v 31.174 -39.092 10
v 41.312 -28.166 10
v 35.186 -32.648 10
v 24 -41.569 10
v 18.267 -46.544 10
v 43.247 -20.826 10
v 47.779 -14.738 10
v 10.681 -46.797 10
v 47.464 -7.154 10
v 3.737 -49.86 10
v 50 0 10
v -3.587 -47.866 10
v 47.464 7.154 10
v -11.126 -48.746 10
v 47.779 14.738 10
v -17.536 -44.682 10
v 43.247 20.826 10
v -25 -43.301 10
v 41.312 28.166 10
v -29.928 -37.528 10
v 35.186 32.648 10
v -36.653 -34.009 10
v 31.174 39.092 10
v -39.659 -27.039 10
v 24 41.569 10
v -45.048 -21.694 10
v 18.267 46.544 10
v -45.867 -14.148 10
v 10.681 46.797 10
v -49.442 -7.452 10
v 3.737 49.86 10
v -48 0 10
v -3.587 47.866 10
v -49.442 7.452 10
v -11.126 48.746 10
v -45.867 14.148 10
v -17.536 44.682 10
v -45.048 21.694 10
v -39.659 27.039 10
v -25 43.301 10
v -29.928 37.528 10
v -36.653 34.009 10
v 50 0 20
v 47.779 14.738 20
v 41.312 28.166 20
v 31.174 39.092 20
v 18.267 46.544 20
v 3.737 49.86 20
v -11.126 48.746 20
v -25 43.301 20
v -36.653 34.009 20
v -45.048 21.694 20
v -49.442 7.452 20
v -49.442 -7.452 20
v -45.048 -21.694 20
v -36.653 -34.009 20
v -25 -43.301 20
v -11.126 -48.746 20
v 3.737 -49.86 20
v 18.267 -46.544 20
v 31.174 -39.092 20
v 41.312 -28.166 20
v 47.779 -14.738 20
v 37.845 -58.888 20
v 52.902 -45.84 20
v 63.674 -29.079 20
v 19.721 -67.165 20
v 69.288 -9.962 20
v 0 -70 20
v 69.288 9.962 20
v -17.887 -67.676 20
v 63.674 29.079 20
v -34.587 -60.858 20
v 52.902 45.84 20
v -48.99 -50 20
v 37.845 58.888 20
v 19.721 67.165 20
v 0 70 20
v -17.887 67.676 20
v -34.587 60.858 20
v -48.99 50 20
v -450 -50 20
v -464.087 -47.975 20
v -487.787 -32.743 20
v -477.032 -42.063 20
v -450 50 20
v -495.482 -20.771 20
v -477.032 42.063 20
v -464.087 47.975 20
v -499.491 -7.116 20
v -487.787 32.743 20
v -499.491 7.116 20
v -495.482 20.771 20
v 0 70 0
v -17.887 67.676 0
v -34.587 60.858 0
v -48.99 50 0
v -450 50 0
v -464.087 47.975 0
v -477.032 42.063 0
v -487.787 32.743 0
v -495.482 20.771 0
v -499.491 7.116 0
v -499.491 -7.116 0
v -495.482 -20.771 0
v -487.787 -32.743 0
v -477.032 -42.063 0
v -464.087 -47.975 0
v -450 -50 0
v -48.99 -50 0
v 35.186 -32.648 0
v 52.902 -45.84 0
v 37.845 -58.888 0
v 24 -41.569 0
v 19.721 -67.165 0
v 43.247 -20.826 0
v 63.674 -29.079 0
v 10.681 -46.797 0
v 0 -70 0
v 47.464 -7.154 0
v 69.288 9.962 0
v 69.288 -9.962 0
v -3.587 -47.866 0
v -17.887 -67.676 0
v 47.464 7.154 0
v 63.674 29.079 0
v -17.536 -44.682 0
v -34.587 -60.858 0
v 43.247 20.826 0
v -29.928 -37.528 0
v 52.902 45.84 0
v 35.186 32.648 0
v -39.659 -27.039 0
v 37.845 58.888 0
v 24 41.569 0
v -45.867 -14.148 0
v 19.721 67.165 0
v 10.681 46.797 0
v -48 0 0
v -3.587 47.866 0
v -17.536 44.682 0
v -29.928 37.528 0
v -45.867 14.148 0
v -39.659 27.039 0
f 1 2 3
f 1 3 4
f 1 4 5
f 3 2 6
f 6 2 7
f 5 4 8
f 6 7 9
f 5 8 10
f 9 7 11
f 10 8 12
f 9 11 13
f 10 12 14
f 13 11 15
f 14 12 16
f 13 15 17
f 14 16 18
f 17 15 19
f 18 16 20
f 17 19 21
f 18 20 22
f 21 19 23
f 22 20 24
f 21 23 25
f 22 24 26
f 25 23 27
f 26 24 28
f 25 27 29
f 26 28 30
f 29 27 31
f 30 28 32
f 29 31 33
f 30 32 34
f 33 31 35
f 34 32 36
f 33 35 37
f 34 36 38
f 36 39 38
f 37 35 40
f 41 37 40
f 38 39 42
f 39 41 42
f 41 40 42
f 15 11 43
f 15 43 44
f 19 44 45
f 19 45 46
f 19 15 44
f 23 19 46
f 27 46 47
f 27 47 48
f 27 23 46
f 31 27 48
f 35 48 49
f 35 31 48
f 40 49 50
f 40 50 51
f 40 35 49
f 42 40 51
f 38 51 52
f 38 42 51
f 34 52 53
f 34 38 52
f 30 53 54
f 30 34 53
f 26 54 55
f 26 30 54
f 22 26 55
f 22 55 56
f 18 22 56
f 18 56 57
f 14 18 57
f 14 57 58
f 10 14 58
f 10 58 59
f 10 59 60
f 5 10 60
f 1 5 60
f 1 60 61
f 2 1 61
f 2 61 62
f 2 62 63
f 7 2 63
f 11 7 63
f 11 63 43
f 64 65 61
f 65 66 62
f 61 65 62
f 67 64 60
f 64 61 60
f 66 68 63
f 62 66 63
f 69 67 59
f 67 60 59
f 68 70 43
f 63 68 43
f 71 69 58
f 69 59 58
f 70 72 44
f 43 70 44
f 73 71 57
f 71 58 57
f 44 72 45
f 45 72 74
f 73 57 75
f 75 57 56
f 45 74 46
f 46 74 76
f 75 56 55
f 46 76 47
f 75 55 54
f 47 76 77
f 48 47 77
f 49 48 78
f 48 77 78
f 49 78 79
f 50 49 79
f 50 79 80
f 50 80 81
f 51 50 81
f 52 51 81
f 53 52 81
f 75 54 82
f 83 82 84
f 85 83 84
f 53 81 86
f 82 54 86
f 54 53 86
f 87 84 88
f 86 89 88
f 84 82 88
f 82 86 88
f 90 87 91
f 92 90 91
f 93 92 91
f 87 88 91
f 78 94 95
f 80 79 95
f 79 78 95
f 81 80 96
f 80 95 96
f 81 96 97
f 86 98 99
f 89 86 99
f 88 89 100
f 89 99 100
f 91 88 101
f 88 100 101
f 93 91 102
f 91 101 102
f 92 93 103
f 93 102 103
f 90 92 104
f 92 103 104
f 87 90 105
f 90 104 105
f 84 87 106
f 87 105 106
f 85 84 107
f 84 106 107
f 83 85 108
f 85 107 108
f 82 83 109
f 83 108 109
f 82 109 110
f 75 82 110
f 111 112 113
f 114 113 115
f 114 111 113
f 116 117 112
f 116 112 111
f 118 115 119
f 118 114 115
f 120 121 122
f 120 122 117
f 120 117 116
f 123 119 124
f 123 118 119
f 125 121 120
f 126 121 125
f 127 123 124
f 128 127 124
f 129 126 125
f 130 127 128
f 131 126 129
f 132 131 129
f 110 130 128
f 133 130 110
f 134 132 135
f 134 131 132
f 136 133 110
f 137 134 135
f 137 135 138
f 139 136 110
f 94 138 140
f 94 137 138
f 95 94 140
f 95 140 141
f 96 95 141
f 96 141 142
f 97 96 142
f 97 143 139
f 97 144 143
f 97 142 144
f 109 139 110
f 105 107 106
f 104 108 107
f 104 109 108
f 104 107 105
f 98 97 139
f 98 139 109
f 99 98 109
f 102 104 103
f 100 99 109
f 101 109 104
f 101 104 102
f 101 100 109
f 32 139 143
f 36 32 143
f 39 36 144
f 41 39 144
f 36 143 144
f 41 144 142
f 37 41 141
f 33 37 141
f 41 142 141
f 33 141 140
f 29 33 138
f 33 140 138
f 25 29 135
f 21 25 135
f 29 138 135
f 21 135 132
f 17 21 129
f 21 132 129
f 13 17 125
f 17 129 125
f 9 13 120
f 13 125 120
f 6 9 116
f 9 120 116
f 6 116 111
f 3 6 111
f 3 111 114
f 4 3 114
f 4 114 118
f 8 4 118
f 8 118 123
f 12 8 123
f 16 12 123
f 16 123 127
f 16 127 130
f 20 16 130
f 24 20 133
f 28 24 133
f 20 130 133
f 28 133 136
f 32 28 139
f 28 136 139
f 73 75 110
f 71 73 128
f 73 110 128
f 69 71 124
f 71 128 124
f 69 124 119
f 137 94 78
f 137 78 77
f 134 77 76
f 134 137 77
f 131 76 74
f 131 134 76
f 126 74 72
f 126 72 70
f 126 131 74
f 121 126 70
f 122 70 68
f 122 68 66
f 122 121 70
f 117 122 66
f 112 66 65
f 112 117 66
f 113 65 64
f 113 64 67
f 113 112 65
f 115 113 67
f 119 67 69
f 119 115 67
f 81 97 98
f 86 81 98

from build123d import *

# Parameters (mm, degrees)
ESQUISSE1_R             = 50
BOSS_EXTRU_1_DEPTH      = 20
ESQUISSE2_R             = 50
ESQUISSE2_R_2           = 48
BOSS_EXTRU_2_DEPTH      = 10
ESQUISSE3_OUTSIDE_W     = 713.342
ESQUISSE3_OUTSIDE_H     = 263.342
ENL_V_MAT_EXTRU_1_DEPTH = 21


with BuildPart() as part:
    # Esquisse1 → Boss.-Extru.1 (new body)
    with BuildSketch(Plane.XY):
        with BuildLine():
            Line((0, -70), (-450, -70))
            ThreePointArc((-450, -70), (-520, 0), (-450, 70))
            Line((-450, 70), (0, 70))
            ThreePointArc((0, 70), (70, 0), (0, -70))
        make_face()
        Circle(ESQUISSE1_R, mode=Mode.SUBTRACT)
    extrude(amount=BOSS_EXTRU_1_DEPTH)

    # Esquisse2 → Boss.-Extru.2 (add)
    with BuildSketch(Plane(origin=(0, 0, 0), x_dir=(-1, 0, 0), z_dir=(0, 0, -1))):
        Circle(ESQUISSE2_R)
        Circle(ESQUISSE2_R_2, mode=Mode.SUBTRACT)
    extrude(amount=-BOSS_EXTRU_2_DEPTH)

    # Esquisse3 outside → Enlèv. mat.-Extru.1 (cut, through all)
    with BuildSketch(Plane(origin=(0, 0, 0), x_dir=(-1, 0, 0), z_dir=(0, 0, -1))):
        with Locations((225, 0)):
            Rectangle(ESQUISSE3_OUTSIDE_W, ESQUISSE3_OUTSIDE_H)
        with BuildLine():
            Line((450, -50), (48.989794856, -50))
            ThreePointArc((48.989794856, -50), (-70, 0), (48.989794856, 50))
            Line((48.989794856, 50), (450, 50))
            ThreePointArc((450, 50), (500, 0), (450, -50))
        make_face(mode=Mode.SUBTRACT)
    extrude(amount=-ENL_V_MAT_EXTRU_1_DEPTH, mode=Mode.SUBTRACT)


solid = part.part
